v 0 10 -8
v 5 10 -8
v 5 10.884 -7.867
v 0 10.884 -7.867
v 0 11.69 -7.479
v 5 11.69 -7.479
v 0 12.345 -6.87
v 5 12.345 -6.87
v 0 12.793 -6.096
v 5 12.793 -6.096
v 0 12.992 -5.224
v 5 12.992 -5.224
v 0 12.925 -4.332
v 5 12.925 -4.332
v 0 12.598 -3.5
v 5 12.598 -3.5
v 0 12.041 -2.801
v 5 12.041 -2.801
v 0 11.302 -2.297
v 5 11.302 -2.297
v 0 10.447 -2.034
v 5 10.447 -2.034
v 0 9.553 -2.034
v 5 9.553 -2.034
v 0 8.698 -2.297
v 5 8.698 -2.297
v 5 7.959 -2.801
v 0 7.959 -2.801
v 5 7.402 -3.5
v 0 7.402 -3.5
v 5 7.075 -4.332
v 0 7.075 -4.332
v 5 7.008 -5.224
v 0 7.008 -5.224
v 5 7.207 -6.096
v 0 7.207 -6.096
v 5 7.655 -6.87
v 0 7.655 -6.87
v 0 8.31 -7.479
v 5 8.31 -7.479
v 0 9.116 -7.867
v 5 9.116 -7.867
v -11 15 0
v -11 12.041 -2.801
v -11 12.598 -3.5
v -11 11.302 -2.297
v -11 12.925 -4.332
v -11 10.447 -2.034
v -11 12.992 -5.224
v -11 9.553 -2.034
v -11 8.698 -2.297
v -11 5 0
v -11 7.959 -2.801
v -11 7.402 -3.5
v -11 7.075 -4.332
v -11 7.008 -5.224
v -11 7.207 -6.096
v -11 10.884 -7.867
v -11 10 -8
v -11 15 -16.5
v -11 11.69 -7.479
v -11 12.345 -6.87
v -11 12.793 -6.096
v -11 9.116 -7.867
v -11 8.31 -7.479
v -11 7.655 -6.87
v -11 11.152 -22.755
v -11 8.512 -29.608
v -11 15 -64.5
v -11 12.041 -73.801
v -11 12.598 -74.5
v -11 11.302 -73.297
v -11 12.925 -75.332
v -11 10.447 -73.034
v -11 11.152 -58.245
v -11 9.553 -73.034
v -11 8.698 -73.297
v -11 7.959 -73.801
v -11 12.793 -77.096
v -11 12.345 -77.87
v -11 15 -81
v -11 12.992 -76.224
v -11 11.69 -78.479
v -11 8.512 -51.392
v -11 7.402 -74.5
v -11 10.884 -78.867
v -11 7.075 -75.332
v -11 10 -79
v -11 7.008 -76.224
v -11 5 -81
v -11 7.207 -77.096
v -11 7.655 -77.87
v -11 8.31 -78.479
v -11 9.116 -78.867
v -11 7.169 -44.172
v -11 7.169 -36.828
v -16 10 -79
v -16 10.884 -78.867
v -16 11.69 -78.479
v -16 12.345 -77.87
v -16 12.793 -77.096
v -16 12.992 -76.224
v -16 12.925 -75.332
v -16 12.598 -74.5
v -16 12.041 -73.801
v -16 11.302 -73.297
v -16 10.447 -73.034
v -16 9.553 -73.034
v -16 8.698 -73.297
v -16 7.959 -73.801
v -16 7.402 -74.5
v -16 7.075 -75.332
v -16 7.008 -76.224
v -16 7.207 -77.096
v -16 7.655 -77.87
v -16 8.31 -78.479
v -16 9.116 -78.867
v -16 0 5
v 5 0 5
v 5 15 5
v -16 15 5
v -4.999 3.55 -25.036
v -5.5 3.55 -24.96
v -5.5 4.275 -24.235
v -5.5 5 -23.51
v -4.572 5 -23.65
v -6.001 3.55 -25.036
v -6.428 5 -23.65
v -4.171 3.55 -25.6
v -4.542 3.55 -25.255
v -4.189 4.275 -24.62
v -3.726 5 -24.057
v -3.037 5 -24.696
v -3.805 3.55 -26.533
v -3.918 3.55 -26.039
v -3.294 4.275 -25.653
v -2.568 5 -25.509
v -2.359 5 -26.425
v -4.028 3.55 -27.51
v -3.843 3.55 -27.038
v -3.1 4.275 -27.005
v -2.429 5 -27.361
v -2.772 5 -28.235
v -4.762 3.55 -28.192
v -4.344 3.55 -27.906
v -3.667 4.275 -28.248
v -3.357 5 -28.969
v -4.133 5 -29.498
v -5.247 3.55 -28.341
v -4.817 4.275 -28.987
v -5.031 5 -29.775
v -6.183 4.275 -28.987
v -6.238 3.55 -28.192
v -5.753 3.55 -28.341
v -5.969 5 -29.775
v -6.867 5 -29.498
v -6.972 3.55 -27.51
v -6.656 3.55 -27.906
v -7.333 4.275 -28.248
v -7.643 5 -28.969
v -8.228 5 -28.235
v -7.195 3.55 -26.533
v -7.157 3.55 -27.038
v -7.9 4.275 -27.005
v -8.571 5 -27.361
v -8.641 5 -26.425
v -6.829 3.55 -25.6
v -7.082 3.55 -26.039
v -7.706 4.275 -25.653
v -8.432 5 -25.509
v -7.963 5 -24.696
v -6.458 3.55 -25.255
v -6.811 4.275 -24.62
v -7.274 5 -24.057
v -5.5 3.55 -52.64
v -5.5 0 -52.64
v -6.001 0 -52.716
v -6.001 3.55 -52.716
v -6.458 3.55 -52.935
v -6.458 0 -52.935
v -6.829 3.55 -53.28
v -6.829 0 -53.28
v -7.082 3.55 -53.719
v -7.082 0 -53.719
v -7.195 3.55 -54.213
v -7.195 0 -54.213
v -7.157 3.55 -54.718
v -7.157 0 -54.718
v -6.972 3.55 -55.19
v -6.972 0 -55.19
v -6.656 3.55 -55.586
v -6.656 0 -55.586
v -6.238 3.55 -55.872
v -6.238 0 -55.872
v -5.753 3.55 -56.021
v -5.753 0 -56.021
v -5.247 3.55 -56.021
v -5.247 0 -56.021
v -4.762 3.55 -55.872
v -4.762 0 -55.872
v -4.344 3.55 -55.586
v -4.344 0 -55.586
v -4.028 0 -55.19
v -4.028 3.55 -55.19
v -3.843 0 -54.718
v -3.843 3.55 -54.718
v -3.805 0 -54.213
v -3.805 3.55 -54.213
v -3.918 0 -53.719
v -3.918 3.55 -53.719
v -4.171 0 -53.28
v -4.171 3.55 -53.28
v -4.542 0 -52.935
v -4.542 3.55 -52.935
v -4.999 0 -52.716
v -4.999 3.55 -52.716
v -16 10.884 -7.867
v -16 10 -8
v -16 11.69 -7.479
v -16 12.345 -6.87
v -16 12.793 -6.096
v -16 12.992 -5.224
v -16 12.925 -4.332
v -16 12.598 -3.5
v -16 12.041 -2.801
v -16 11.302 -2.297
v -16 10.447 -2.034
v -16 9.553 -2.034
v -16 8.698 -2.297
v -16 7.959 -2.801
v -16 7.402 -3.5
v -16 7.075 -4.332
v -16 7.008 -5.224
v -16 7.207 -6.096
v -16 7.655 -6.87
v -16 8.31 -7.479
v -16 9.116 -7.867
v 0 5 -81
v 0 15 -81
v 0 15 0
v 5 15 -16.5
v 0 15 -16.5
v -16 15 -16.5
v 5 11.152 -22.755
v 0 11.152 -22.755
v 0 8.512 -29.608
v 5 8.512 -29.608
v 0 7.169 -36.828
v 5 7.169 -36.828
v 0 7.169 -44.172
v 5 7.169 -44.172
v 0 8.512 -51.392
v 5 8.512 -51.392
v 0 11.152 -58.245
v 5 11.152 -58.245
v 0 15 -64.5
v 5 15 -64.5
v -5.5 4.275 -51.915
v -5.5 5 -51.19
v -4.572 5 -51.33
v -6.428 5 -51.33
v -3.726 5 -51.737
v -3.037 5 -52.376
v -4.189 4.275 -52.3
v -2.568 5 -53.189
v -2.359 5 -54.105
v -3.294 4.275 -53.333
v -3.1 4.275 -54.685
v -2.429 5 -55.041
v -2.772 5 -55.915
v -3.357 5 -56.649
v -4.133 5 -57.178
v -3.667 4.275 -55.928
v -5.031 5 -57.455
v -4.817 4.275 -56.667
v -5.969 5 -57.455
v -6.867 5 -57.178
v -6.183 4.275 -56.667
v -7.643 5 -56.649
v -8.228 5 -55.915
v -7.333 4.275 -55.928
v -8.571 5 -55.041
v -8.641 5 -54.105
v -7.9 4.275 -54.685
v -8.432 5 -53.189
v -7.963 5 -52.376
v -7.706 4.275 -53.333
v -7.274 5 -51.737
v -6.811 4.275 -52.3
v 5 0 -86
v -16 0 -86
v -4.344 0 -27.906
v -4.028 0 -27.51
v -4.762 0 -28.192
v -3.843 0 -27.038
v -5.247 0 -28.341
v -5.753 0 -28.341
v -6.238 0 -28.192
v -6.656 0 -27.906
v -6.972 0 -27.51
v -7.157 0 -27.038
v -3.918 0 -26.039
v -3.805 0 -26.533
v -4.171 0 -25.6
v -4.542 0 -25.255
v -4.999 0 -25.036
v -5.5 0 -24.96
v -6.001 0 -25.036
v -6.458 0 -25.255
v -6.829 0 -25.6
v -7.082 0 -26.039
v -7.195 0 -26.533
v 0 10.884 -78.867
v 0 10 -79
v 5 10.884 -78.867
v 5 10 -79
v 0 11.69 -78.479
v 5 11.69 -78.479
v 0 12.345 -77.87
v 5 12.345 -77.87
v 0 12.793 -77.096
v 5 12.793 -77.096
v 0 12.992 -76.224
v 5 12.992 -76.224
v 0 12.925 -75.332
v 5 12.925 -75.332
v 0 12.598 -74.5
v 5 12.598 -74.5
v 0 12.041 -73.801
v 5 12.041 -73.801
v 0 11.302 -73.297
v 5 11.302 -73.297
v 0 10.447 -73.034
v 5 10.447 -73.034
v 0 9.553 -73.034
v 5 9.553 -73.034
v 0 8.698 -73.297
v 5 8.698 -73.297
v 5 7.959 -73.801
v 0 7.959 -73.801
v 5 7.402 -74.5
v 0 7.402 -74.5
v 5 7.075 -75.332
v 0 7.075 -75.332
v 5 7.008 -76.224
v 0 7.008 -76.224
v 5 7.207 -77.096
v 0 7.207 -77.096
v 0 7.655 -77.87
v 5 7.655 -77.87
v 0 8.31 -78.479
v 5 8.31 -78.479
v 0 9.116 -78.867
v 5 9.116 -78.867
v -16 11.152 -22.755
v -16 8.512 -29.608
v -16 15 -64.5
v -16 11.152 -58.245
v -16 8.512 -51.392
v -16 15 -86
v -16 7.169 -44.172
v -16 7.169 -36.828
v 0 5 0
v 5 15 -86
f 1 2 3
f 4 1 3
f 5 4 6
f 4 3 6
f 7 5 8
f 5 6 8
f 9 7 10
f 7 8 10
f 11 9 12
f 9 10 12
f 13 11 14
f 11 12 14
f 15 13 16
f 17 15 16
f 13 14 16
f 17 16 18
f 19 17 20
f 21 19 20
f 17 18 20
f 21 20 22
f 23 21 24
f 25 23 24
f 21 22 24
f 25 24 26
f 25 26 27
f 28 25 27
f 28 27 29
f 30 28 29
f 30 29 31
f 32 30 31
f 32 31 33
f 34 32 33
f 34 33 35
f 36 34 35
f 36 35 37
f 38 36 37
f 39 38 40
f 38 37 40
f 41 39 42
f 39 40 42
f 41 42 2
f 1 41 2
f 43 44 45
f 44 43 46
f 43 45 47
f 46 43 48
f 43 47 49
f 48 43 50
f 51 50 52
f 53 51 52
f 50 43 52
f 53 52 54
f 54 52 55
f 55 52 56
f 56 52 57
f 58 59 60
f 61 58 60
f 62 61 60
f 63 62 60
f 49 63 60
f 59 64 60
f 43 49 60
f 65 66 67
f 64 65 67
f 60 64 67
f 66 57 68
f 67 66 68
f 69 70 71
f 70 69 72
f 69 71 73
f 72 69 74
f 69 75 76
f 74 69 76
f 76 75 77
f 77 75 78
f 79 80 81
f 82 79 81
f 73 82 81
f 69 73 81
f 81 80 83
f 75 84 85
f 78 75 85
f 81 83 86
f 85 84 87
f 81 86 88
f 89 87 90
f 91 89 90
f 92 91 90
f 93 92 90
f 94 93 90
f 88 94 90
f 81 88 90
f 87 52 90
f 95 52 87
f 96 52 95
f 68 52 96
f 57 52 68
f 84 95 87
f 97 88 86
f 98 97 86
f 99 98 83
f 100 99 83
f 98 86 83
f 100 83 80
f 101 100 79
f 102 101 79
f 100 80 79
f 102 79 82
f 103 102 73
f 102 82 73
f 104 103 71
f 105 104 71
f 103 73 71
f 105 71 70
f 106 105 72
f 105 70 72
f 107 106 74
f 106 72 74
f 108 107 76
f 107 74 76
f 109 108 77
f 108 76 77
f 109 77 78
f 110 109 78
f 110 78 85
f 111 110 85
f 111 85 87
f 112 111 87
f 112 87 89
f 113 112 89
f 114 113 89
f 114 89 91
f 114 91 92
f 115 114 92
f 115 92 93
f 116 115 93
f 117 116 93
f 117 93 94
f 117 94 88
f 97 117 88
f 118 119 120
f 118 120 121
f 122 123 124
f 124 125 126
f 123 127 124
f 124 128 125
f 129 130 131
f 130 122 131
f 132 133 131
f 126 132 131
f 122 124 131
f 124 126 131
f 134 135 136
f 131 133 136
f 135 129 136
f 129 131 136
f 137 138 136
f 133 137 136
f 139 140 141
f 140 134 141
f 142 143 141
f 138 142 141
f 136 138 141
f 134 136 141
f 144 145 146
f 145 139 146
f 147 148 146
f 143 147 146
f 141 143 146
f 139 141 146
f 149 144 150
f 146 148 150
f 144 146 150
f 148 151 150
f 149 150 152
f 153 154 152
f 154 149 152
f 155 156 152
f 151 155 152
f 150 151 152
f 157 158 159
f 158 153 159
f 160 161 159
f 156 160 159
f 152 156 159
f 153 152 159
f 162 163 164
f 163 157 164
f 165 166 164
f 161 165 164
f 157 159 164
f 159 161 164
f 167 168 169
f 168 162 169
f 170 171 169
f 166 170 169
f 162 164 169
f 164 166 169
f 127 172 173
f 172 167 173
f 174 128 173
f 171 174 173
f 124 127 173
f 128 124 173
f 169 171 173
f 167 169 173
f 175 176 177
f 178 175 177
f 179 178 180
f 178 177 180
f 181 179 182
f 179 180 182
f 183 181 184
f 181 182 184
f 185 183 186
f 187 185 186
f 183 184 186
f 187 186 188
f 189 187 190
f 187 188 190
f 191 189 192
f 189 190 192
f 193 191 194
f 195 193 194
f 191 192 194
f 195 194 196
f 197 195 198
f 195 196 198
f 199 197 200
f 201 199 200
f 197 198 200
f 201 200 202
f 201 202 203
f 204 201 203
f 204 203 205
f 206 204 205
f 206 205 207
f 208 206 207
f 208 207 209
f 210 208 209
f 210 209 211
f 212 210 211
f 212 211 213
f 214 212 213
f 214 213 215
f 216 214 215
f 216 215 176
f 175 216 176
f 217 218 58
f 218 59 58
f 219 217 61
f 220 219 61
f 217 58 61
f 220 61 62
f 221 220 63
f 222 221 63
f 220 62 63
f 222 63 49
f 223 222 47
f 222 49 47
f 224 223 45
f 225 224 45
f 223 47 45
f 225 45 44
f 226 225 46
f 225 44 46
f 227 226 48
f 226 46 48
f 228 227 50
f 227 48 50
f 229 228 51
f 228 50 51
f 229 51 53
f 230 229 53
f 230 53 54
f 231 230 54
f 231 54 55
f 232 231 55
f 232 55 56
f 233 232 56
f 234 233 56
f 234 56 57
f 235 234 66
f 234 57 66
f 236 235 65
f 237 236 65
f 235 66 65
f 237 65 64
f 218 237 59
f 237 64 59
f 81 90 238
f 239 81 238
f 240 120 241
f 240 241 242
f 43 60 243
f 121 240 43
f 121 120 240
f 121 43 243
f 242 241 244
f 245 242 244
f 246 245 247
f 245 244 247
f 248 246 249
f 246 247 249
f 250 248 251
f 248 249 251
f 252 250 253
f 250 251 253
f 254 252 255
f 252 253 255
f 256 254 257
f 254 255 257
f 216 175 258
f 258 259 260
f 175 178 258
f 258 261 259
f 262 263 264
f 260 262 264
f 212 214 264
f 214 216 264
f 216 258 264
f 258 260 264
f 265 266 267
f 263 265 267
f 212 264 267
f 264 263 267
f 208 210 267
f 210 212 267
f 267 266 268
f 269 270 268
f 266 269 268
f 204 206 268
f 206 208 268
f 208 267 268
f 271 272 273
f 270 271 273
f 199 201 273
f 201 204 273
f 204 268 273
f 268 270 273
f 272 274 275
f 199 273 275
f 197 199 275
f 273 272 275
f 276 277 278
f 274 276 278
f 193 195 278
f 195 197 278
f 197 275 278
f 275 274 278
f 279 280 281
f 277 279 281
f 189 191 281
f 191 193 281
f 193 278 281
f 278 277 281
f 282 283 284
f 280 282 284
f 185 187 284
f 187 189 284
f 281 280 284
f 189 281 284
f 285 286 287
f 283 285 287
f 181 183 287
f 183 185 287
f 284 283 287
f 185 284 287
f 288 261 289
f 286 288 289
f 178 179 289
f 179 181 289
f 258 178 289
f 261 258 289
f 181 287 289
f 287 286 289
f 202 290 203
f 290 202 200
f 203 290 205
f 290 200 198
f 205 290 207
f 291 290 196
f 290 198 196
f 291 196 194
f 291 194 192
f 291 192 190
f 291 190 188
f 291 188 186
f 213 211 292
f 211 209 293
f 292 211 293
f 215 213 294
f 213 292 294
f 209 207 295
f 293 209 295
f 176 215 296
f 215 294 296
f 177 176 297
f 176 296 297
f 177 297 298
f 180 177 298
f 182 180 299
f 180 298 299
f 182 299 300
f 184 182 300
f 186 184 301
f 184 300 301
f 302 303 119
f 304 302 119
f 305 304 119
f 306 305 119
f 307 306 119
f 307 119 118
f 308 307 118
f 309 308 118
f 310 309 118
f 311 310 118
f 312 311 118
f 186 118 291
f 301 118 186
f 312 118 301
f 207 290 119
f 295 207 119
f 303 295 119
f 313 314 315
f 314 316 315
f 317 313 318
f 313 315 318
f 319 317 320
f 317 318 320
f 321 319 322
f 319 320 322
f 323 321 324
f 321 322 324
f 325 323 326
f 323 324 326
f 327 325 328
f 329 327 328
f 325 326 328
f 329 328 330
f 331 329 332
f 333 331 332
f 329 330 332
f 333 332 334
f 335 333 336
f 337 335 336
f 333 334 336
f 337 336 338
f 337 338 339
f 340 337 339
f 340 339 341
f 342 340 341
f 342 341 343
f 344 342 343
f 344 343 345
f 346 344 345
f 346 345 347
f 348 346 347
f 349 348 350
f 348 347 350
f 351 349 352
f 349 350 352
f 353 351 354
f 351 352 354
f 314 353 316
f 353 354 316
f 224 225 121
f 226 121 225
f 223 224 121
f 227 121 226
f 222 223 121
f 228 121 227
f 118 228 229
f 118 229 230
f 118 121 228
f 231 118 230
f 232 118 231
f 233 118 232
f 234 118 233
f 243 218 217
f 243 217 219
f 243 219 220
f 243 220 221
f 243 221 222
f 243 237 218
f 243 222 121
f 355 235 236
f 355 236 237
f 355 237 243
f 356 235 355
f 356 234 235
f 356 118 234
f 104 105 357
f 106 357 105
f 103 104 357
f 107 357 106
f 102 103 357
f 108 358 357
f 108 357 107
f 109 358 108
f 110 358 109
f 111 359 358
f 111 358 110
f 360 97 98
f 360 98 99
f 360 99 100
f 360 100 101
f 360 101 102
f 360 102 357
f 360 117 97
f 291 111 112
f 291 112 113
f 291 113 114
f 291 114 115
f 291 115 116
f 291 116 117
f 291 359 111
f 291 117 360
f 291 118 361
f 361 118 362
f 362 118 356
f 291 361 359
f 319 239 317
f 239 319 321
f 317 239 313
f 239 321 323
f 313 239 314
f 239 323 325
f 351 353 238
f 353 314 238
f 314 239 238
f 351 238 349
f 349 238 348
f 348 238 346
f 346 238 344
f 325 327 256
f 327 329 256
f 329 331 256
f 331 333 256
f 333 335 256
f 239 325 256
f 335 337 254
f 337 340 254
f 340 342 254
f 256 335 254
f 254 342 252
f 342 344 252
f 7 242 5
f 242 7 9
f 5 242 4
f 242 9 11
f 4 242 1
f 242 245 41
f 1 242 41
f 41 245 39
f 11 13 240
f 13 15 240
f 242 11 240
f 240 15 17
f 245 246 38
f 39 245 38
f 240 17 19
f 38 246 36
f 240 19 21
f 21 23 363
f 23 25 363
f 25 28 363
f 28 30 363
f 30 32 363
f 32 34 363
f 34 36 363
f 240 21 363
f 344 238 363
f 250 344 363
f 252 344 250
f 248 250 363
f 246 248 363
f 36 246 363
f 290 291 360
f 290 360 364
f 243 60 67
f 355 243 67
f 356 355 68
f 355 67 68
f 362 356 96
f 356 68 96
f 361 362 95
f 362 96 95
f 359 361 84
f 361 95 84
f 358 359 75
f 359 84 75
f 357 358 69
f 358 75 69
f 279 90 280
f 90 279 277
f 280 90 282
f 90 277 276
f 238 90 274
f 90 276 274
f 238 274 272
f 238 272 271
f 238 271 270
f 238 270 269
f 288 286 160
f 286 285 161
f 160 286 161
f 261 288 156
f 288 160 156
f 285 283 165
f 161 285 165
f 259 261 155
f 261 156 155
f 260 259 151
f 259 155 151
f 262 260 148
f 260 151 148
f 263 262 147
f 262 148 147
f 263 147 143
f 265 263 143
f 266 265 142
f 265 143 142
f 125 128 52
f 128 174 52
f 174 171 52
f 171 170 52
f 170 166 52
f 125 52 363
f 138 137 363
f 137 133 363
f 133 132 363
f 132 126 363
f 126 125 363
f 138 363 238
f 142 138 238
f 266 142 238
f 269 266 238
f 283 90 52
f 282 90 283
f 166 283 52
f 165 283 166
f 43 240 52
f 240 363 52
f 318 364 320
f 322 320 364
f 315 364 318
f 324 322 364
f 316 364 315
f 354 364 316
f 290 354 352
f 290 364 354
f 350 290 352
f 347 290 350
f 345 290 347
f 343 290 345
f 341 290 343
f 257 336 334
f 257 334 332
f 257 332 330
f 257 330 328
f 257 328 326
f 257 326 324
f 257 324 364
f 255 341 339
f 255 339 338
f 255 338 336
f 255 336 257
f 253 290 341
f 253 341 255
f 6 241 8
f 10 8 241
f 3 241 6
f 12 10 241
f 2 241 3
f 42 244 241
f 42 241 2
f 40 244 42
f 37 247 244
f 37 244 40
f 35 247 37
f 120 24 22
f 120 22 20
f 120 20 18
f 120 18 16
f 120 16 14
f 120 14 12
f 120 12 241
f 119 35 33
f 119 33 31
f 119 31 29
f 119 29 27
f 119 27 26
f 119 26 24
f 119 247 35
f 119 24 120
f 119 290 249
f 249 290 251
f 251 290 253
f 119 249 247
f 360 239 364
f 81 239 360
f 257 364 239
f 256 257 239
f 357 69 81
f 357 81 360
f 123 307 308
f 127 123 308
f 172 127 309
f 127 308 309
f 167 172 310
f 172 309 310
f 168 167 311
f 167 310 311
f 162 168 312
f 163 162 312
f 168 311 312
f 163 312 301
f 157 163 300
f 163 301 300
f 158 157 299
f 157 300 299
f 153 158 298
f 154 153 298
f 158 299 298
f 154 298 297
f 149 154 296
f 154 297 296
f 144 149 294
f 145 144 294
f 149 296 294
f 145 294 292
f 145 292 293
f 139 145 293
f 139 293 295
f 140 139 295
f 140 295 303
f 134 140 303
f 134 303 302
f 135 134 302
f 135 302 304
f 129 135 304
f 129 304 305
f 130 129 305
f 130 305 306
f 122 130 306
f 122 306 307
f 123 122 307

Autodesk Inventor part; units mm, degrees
ref_plane "YZ Plane" through (0, 0, 0) normal (1, 0, 0) x (0, 1, 0)
ref_plane "XZ Plane" through (0, 0, 0) normal (0, 1, 0) x (-1, 0, 0)
ref_plane "XY Plane" through (0, 0, 0) normal (0, 0, 1) x (1, 0, 0)
sketch "Boceto1" plane through (0, 0, 0) normal (0, 1, 0) x (-1, 0, 0)
  point P0 (0, 0)
sketch "Boceto2" plane through (0, 0, 0) normal (0, 1, 0) x (-1, 0, 0)
  line L0 (0, 0) -> (11, 0)
  line L1 (11, 0) -> (11, -81)
  line L2 (11, -81) -> (0, -81)
  line L3 (0, -81) -> (0, 0)
  line L4 (-5, 0) -> (-5, 5)
  line L5 (11, -86) -> (16, -86)
  line L6 (-5, 5) -> (16, 5)
  line L7 (16, 5) -> (16, -86)
  line L8 (16, -86) -> (-5, -86)
  line L9 (-5, -86) -> (-5, 5)
  dimension "d0" = 81
  dimension "d1" = 5
  dimension "d2" = 5
  dimension "d3" = 5
  dimension "d4" = 5
extrude "Extrusión1" add sketch "Boceto2" along normal blind 15
sketch "Boceto3" plane through (0, 0, 0) normal (0, -1, 0) x (1, 0, 0)
  line L0 (0, -81) -> (0, 0) projected
  line L1 (-11, 0) -> (-11, -81) projected
  line L2 (0, 0) -> (-11, 0)
  line L3 (-11, 0) -> (-11, -81)
  line L4 (-11, -81) -> (0, -81)
  line L5 (0, -81) -> (0, 0)
extrude "Extrusión2" add sketch "Boceto3" against normal blind 5
sketch "Boceto4" plane through (0, 5, 0) normal (0, 1, 0) x (1, 0, 0)
  line L0 (0, 0) -> (-11, 0) projected
  line L1 (-5.5, 0) -> (-5.5, 81)
  line L2 (-11, 81) -> (0, 81) projected
  line L3 (-5.5, 0) -> (-5.5, 26.66)
  line L4 (-5.5, 81) -> (-5.5, 54.34)
  dimension "d9" = 26.66
  dimension "d10" = 26.66
hole "Agujero1" at (-5.5, 5, -26.66) at (-5.5, 5, -54.34) direction (0, -1, 0) diameter 3.4 depth 5 countersink diameter 6.3 countersink angle 90 clearance for "Tornillo para maquinaria de cabeza plana" size "M3" standard "Perfil M métrico ANSI"
sketch "Boceto5" plane through (5, 0, 5) normal (1, 0, 0) x (0, 0, -1)
  line L0 (0, 0) -> (45.5, 0)
  line L1 (0, 0) -> (91, 0) projected
  line L2 (45.5, 0) -> (45.5, 5)
  line L3 (45.5, 5) -> (45.5, 7)
  line L4 (45.5, 7) -> (45.5, 47)
  circle A0 centre (45.5, 47) radius 40
  point P0 (5, 0)
  dimension "d18" = 45.5
  dimension "d19" = 5
  dimension "d20" = 2
  dimension "d21" = 40
extrude "Extrusión3" cut sketch "Boceto5" against normal blind 32
sketch "Boceto6" plane through (5, 0, 5) normal (1, 0, 0) x (0, 0, -1)
  line L0 (0, 0) -> (0, 15) projected
  line L1 (91, 0) -> (91, 15) projected
  line L2 (91, 0) -> (0, 0) projected
  line L3 (0, 0) -> (10, 0)
  line L4 (10, 0) -> (10, 10)
  circle A0 centre (10, 10) radius 3
  line L5 (91, 0) -> (81, 0)
  line L6 (0, 0) -> (91, 0) projected
  line L7 (81, 0) -> (81, 10)
  circle A1 centre (81, 10) radius 3
  point P0 (5, 0)
  dimension "d26" = 10
  dimension "d27" = 10
  dimension "d29" = 6
  dimension "d30" = 10
  dimension "d31" = 10
sketch "Boceto7" plane through (5, 0, 5) normal (1, 0, 0) x (0, 0, -1)
  line L0 (5, 5) -> (45.5, 5)
  line L1 (86, 5) -> (5, 5) projected
  point P0 (5, 0)
extrude "Extrusión4" cut sketch "Boceto6" against normal blind 58
properties part number "Base ventilador ahora si"
